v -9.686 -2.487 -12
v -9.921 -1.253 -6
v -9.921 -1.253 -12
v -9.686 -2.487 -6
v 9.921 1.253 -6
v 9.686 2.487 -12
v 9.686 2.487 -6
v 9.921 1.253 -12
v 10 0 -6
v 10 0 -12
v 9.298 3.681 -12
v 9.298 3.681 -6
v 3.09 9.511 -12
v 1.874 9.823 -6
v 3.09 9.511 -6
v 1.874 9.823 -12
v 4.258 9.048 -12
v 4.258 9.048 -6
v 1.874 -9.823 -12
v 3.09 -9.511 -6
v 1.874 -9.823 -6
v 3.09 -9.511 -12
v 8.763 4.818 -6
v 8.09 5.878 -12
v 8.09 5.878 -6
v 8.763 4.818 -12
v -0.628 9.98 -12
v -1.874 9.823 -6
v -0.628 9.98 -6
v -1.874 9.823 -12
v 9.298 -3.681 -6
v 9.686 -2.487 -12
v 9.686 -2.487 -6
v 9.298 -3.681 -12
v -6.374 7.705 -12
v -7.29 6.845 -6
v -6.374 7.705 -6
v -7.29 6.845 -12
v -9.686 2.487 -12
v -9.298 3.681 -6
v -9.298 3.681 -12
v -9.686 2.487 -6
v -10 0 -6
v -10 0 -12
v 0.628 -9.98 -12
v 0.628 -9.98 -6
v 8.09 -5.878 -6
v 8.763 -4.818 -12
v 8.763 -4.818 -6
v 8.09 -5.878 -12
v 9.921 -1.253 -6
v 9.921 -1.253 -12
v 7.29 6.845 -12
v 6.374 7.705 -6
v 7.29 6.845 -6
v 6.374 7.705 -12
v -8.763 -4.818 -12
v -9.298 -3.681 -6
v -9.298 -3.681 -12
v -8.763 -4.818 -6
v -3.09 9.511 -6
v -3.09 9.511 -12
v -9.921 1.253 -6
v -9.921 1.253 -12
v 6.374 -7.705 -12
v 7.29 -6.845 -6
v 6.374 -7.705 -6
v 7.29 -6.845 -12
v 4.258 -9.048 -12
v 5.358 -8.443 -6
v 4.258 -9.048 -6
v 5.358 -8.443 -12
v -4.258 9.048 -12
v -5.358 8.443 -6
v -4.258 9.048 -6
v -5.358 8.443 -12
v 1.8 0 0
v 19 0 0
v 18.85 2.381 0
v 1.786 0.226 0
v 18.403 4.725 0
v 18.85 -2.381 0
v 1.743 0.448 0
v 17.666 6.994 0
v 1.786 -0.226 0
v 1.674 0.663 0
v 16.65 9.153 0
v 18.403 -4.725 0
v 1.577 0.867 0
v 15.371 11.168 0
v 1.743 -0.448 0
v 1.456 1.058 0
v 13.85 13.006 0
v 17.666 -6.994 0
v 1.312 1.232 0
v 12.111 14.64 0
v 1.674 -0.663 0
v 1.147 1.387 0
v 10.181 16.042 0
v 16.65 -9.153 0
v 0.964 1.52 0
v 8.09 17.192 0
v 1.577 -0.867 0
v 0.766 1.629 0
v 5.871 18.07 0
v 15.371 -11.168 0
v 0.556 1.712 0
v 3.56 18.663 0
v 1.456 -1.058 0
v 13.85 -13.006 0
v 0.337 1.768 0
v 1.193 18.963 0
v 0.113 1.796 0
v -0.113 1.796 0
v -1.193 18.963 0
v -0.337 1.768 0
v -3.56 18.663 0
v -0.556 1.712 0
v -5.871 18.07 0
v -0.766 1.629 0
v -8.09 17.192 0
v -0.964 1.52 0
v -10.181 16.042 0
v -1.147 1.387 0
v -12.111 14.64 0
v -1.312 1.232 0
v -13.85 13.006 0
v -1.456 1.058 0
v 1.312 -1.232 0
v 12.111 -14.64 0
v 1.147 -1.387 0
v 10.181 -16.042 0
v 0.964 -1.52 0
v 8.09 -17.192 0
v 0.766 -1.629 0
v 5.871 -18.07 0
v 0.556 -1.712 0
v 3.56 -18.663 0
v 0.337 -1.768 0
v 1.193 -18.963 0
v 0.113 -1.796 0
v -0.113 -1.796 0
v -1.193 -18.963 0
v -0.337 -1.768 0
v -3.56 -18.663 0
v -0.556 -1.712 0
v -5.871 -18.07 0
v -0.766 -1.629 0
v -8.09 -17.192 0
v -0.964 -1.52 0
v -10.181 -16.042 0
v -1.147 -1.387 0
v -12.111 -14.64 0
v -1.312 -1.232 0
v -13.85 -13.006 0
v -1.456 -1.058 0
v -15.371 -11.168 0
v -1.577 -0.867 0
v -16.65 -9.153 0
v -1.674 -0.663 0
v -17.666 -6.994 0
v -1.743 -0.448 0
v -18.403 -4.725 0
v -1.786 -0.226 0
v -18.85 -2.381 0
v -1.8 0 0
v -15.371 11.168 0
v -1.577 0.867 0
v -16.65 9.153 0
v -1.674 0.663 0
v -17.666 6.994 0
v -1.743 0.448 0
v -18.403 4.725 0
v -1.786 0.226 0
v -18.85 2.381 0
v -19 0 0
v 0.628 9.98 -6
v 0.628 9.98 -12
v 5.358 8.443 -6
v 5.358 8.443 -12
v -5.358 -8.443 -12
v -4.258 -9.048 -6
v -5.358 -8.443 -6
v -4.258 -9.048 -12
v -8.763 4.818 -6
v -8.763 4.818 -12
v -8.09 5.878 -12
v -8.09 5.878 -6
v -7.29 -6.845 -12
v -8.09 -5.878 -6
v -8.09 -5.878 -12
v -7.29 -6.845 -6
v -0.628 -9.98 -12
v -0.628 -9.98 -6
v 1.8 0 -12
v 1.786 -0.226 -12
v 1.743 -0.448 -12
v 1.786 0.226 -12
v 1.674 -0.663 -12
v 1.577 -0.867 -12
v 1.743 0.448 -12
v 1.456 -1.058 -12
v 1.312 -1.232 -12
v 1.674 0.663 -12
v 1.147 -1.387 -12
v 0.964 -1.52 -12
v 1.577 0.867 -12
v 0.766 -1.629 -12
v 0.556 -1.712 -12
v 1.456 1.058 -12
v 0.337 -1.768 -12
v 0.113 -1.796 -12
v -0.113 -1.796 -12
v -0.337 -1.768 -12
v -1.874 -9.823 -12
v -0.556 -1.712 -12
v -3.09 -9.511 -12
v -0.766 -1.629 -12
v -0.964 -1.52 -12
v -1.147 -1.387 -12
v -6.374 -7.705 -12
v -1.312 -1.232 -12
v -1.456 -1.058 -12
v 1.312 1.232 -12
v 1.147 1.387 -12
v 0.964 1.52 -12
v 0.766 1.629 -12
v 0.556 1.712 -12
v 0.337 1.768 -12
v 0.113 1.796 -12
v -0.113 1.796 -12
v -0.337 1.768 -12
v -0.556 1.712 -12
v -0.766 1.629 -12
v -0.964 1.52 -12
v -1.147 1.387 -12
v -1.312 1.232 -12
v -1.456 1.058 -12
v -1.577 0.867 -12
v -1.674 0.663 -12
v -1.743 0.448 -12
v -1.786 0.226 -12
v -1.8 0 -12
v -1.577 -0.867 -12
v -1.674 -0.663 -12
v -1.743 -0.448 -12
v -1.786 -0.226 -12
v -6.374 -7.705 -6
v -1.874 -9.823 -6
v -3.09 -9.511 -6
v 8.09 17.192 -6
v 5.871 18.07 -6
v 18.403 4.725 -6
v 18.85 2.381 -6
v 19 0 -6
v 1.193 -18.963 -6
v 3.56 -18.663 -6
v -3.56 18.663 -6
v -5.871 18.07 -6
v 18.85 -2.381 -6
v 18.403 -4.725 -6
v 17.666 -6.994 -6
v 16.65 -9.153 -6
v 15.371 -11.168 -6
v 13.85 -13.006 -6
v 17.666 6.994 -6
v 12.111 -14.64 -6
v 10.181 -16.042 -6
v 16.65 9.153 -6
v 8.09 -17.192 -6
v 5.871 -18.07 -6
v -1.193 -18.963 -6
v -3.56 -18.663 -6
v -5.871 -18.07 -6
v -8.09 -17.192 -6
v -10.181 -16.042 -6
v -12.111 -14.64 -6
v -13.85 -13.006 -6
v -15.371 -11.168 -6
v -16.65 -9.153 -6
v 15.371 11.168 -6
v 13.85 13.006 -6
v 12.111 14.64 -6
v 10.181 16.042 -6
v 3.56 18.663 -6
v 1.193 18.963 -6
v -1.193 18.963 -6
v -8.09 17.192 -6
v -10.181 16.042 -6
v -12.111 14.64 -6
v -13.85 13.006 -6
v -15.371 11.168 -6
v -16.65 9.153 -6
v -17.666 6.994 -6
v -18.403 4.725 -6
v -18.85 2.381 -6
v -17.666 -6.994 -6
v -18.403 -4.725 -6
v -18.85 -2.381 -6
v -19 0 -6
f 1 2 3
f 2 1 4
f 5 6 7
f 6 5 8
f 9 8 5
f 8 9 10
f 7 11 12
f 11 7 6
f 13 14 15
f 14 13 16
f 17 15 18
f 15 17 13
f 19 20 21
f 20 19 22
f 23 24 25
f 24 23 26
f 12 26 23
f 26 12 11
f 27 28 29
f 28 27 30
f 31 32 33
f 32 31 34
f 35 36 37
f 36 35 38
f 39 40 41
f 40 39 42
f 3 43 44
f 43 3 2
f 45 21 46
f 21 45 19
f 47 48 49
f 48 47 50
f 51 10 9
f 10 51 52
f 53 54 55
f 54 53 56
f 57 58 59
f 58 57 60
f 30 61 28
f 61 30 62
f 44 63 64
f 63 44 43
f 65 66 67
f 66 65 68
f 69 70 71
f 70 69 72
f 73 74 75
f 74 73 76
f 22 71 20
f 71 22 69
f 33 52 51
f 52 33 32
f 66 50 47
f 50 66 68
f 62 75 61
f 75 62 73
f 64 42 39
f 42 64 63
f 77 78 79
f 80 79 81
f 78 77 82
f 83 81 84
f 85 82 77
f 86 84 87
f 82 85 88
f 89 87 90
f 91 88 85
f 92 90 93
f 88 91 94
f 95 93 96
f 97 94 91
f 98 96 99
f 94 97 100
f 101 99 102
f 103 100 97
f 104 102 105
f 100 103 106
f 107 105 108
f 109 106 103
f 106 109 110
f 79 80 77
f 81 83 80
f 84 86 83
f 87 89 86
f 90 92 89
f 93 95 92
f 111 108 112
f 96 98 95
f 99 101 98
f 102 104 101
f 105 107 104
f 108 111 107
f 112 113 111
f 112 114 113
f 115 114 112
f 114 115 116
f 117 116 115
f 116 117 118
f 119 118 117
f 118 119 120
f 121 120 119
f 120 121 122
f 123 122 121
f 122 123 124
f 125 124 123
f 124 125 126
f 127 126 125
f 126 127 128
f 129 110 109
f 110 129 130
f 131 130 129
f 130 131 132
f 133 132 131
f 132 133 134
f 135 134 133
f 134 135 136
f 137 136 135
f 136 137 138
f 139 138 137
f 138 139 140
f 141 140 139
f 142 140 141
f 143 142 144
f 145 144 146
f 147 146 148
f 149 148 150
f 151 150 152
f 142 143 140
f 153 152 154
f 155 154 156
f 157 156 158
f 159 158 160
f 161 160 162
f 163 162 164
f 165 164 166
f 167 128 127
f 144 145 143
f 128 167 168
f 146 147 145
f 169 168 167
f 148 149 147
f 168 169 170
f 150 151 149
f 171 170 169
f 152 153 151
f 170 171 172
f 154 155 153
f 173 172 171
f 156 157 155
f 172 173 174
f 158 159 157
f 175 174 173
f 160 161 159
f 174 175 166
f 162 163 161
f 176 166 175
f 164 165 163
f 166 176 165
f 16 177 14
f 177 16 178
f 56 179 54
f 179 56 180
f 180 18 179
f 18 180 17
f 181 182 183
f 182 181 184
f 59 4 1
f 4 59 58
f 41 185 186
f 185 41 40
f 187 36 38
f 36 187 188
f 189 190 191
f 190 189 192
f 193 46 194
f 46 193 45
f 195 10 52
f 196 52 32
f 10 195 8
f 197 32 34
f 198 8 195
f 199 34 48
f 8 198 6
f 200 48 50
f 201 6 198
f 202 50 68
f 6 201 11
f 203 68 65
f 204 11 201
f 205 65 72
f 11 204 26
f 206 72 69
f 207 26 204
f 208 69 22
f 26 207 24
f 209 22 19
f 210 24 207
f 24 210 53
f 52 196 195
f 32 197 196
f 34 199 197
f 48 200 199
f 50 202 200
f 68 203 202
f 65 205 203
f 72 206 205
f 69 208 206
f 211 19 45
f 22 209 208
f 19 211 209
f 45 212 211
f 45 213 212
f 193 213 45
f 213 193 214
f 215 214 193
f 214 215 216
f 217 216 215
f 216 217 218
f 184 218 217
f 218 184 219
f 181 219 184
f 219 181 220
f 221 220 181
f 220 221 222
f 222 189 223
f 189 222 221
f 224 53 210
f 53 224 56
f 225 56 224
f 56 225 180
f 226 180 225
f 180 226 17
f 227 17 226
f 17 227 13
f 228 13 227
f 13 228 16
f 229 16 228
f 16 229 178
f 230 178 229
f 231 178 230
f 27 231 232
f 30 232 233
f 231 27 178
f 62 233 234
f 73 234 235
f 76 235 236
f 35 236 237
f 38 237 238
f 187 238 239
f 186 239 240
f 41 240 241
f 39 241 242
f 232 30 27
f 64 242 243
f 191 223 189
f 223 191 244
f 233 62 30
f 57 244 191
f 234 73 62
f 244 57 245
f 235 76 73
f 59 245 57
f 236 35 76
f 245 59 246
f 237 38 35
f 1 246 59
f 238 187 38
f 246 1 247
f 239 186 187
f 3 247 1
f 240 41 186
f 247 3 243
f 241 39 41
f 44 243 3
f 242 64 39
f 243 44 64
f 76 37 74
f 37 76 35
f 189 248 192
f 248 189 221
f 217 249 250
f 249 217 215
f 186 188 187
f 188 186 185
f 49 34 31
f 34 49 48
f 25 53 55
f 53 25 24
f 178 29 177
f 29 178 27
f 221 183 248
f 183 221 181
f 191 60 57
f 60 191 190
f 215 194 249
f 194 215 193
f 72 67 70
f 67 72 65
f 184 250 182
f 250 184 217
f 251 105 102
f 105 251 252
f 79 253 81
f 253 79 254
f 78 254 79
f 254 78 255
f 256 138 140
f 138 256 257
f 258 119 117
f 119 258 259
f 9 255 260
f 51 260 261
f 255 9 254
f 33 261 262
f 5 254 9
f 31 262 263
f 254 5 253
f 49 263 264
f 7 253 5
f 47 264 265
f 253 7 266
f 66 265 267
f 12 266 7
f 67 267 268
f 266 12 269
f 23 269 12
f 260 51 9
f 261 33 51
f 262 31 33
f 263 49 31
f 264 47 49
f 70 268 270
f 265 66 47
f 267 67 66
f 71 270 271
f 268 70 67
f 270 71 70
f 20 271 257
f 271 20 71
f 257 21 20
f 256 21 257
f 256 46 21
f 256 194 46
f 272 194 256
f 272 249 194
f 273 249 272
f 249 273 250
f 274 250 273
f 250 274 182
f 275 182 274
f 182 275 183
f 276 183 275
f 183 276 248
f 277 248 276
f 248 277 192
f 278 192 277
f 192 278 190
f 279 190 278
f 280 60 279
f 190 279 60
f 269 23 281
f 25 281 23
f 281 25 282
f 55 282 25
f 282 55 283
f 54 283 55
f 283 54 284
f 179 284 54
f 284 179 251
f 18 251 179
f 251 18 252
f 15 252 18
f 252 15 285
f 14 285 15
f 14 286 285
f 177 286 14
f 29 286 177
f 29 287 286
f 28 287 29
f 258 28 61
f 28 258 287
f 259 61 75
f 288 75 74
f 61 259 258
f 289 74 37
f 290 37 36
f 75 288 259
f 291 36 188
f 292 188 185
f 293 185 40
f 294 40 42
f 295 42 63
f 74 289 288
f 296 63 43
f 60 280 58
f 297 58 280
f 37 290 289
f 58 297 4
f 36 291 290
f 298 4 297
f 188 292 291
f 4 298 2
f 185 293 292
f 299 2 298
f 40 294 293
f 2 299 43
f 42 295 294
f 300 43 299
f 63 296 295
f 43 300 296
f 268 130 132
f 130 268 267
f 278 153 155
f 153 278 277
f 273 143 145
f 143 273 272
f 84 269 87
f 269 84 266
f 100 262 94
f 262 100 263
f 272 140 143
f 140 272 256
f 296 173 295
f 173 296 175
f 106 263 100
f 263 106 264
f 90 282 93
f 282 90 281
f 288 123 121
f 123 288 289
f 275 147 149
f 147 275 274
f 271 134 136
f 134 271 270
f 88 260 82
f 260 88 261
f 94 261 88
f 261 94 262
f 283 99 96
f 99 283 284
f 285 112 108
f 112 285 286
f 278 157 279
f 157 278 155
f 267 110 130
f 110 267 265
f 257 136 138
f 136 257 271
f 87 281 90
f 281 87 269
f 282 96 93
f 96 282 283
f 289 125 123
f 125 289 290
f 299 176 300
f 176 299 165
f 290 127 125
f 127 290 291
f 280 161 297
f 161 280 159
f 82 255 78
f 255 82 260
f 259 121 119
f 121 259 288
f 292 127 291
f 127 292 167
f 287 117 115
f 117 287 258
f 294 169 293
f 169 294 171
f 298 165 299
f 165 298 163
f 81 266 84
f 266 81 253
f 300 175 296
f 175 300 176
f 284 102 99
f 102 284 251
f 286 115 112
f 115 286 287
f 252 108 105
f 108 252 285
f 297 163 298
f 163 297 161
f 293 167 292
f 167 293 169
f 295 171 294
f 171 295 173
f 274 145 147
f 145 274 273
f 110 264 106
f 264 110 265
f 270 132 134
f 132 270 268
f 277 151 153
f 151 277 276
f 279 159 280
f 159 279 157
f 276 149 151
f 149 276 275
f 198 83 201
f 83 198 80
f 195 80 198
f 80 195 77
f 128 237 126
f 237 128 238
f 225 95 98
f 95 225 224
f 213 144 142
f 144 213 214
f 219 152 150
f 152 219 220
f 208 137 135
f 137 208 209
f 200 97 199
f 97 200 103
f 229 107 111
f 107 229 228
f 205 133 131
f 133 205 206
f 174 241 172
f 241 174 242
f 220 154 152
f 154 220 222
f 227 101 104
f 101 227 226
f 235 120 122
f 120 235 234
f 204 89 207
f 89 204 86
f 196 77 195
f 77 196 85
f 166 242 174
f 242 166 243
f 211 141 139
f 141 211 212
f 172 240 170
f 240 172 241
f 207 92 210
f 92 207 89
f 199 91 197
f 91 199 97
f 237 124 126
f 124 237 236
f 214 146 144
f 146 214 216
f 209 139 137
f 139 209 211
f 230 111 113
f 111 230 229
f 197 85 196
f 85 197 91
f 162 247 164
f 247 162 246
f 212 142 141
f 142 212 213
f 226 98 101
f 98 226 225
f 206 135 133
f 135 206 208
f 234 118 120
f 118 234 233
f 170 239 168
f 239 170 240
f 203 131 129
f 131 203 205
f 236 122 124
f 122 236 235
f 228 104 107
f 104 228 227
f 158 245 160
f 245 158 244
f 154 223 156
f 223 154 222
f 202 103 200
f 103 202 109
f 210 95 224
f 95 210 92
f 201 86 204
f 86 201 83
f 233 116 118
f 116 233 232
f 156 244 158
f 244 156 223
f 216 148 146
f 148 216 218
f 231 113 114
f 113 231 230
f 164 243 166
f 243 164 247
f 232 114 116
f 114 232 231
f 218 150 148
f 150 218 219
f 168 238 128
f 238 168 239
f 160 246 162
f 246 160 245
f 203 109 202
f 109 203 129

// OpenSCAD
$fn = 50;


difference() {
	union() {
		translate(v = [0, 0, -12.0000000000]) {
			cylinder(h = 12, r = 10.0000000000);
		}
		translate(v = [0, 0, -6.0000000000]) {
			cylinder(h = 6, r = 19.0000000000);
		}
	}
	union() {
		#translate(v = [0, 0, -12]) {
			cylinder(h = 12, r = 1.8000000000);
		}
	}
}
